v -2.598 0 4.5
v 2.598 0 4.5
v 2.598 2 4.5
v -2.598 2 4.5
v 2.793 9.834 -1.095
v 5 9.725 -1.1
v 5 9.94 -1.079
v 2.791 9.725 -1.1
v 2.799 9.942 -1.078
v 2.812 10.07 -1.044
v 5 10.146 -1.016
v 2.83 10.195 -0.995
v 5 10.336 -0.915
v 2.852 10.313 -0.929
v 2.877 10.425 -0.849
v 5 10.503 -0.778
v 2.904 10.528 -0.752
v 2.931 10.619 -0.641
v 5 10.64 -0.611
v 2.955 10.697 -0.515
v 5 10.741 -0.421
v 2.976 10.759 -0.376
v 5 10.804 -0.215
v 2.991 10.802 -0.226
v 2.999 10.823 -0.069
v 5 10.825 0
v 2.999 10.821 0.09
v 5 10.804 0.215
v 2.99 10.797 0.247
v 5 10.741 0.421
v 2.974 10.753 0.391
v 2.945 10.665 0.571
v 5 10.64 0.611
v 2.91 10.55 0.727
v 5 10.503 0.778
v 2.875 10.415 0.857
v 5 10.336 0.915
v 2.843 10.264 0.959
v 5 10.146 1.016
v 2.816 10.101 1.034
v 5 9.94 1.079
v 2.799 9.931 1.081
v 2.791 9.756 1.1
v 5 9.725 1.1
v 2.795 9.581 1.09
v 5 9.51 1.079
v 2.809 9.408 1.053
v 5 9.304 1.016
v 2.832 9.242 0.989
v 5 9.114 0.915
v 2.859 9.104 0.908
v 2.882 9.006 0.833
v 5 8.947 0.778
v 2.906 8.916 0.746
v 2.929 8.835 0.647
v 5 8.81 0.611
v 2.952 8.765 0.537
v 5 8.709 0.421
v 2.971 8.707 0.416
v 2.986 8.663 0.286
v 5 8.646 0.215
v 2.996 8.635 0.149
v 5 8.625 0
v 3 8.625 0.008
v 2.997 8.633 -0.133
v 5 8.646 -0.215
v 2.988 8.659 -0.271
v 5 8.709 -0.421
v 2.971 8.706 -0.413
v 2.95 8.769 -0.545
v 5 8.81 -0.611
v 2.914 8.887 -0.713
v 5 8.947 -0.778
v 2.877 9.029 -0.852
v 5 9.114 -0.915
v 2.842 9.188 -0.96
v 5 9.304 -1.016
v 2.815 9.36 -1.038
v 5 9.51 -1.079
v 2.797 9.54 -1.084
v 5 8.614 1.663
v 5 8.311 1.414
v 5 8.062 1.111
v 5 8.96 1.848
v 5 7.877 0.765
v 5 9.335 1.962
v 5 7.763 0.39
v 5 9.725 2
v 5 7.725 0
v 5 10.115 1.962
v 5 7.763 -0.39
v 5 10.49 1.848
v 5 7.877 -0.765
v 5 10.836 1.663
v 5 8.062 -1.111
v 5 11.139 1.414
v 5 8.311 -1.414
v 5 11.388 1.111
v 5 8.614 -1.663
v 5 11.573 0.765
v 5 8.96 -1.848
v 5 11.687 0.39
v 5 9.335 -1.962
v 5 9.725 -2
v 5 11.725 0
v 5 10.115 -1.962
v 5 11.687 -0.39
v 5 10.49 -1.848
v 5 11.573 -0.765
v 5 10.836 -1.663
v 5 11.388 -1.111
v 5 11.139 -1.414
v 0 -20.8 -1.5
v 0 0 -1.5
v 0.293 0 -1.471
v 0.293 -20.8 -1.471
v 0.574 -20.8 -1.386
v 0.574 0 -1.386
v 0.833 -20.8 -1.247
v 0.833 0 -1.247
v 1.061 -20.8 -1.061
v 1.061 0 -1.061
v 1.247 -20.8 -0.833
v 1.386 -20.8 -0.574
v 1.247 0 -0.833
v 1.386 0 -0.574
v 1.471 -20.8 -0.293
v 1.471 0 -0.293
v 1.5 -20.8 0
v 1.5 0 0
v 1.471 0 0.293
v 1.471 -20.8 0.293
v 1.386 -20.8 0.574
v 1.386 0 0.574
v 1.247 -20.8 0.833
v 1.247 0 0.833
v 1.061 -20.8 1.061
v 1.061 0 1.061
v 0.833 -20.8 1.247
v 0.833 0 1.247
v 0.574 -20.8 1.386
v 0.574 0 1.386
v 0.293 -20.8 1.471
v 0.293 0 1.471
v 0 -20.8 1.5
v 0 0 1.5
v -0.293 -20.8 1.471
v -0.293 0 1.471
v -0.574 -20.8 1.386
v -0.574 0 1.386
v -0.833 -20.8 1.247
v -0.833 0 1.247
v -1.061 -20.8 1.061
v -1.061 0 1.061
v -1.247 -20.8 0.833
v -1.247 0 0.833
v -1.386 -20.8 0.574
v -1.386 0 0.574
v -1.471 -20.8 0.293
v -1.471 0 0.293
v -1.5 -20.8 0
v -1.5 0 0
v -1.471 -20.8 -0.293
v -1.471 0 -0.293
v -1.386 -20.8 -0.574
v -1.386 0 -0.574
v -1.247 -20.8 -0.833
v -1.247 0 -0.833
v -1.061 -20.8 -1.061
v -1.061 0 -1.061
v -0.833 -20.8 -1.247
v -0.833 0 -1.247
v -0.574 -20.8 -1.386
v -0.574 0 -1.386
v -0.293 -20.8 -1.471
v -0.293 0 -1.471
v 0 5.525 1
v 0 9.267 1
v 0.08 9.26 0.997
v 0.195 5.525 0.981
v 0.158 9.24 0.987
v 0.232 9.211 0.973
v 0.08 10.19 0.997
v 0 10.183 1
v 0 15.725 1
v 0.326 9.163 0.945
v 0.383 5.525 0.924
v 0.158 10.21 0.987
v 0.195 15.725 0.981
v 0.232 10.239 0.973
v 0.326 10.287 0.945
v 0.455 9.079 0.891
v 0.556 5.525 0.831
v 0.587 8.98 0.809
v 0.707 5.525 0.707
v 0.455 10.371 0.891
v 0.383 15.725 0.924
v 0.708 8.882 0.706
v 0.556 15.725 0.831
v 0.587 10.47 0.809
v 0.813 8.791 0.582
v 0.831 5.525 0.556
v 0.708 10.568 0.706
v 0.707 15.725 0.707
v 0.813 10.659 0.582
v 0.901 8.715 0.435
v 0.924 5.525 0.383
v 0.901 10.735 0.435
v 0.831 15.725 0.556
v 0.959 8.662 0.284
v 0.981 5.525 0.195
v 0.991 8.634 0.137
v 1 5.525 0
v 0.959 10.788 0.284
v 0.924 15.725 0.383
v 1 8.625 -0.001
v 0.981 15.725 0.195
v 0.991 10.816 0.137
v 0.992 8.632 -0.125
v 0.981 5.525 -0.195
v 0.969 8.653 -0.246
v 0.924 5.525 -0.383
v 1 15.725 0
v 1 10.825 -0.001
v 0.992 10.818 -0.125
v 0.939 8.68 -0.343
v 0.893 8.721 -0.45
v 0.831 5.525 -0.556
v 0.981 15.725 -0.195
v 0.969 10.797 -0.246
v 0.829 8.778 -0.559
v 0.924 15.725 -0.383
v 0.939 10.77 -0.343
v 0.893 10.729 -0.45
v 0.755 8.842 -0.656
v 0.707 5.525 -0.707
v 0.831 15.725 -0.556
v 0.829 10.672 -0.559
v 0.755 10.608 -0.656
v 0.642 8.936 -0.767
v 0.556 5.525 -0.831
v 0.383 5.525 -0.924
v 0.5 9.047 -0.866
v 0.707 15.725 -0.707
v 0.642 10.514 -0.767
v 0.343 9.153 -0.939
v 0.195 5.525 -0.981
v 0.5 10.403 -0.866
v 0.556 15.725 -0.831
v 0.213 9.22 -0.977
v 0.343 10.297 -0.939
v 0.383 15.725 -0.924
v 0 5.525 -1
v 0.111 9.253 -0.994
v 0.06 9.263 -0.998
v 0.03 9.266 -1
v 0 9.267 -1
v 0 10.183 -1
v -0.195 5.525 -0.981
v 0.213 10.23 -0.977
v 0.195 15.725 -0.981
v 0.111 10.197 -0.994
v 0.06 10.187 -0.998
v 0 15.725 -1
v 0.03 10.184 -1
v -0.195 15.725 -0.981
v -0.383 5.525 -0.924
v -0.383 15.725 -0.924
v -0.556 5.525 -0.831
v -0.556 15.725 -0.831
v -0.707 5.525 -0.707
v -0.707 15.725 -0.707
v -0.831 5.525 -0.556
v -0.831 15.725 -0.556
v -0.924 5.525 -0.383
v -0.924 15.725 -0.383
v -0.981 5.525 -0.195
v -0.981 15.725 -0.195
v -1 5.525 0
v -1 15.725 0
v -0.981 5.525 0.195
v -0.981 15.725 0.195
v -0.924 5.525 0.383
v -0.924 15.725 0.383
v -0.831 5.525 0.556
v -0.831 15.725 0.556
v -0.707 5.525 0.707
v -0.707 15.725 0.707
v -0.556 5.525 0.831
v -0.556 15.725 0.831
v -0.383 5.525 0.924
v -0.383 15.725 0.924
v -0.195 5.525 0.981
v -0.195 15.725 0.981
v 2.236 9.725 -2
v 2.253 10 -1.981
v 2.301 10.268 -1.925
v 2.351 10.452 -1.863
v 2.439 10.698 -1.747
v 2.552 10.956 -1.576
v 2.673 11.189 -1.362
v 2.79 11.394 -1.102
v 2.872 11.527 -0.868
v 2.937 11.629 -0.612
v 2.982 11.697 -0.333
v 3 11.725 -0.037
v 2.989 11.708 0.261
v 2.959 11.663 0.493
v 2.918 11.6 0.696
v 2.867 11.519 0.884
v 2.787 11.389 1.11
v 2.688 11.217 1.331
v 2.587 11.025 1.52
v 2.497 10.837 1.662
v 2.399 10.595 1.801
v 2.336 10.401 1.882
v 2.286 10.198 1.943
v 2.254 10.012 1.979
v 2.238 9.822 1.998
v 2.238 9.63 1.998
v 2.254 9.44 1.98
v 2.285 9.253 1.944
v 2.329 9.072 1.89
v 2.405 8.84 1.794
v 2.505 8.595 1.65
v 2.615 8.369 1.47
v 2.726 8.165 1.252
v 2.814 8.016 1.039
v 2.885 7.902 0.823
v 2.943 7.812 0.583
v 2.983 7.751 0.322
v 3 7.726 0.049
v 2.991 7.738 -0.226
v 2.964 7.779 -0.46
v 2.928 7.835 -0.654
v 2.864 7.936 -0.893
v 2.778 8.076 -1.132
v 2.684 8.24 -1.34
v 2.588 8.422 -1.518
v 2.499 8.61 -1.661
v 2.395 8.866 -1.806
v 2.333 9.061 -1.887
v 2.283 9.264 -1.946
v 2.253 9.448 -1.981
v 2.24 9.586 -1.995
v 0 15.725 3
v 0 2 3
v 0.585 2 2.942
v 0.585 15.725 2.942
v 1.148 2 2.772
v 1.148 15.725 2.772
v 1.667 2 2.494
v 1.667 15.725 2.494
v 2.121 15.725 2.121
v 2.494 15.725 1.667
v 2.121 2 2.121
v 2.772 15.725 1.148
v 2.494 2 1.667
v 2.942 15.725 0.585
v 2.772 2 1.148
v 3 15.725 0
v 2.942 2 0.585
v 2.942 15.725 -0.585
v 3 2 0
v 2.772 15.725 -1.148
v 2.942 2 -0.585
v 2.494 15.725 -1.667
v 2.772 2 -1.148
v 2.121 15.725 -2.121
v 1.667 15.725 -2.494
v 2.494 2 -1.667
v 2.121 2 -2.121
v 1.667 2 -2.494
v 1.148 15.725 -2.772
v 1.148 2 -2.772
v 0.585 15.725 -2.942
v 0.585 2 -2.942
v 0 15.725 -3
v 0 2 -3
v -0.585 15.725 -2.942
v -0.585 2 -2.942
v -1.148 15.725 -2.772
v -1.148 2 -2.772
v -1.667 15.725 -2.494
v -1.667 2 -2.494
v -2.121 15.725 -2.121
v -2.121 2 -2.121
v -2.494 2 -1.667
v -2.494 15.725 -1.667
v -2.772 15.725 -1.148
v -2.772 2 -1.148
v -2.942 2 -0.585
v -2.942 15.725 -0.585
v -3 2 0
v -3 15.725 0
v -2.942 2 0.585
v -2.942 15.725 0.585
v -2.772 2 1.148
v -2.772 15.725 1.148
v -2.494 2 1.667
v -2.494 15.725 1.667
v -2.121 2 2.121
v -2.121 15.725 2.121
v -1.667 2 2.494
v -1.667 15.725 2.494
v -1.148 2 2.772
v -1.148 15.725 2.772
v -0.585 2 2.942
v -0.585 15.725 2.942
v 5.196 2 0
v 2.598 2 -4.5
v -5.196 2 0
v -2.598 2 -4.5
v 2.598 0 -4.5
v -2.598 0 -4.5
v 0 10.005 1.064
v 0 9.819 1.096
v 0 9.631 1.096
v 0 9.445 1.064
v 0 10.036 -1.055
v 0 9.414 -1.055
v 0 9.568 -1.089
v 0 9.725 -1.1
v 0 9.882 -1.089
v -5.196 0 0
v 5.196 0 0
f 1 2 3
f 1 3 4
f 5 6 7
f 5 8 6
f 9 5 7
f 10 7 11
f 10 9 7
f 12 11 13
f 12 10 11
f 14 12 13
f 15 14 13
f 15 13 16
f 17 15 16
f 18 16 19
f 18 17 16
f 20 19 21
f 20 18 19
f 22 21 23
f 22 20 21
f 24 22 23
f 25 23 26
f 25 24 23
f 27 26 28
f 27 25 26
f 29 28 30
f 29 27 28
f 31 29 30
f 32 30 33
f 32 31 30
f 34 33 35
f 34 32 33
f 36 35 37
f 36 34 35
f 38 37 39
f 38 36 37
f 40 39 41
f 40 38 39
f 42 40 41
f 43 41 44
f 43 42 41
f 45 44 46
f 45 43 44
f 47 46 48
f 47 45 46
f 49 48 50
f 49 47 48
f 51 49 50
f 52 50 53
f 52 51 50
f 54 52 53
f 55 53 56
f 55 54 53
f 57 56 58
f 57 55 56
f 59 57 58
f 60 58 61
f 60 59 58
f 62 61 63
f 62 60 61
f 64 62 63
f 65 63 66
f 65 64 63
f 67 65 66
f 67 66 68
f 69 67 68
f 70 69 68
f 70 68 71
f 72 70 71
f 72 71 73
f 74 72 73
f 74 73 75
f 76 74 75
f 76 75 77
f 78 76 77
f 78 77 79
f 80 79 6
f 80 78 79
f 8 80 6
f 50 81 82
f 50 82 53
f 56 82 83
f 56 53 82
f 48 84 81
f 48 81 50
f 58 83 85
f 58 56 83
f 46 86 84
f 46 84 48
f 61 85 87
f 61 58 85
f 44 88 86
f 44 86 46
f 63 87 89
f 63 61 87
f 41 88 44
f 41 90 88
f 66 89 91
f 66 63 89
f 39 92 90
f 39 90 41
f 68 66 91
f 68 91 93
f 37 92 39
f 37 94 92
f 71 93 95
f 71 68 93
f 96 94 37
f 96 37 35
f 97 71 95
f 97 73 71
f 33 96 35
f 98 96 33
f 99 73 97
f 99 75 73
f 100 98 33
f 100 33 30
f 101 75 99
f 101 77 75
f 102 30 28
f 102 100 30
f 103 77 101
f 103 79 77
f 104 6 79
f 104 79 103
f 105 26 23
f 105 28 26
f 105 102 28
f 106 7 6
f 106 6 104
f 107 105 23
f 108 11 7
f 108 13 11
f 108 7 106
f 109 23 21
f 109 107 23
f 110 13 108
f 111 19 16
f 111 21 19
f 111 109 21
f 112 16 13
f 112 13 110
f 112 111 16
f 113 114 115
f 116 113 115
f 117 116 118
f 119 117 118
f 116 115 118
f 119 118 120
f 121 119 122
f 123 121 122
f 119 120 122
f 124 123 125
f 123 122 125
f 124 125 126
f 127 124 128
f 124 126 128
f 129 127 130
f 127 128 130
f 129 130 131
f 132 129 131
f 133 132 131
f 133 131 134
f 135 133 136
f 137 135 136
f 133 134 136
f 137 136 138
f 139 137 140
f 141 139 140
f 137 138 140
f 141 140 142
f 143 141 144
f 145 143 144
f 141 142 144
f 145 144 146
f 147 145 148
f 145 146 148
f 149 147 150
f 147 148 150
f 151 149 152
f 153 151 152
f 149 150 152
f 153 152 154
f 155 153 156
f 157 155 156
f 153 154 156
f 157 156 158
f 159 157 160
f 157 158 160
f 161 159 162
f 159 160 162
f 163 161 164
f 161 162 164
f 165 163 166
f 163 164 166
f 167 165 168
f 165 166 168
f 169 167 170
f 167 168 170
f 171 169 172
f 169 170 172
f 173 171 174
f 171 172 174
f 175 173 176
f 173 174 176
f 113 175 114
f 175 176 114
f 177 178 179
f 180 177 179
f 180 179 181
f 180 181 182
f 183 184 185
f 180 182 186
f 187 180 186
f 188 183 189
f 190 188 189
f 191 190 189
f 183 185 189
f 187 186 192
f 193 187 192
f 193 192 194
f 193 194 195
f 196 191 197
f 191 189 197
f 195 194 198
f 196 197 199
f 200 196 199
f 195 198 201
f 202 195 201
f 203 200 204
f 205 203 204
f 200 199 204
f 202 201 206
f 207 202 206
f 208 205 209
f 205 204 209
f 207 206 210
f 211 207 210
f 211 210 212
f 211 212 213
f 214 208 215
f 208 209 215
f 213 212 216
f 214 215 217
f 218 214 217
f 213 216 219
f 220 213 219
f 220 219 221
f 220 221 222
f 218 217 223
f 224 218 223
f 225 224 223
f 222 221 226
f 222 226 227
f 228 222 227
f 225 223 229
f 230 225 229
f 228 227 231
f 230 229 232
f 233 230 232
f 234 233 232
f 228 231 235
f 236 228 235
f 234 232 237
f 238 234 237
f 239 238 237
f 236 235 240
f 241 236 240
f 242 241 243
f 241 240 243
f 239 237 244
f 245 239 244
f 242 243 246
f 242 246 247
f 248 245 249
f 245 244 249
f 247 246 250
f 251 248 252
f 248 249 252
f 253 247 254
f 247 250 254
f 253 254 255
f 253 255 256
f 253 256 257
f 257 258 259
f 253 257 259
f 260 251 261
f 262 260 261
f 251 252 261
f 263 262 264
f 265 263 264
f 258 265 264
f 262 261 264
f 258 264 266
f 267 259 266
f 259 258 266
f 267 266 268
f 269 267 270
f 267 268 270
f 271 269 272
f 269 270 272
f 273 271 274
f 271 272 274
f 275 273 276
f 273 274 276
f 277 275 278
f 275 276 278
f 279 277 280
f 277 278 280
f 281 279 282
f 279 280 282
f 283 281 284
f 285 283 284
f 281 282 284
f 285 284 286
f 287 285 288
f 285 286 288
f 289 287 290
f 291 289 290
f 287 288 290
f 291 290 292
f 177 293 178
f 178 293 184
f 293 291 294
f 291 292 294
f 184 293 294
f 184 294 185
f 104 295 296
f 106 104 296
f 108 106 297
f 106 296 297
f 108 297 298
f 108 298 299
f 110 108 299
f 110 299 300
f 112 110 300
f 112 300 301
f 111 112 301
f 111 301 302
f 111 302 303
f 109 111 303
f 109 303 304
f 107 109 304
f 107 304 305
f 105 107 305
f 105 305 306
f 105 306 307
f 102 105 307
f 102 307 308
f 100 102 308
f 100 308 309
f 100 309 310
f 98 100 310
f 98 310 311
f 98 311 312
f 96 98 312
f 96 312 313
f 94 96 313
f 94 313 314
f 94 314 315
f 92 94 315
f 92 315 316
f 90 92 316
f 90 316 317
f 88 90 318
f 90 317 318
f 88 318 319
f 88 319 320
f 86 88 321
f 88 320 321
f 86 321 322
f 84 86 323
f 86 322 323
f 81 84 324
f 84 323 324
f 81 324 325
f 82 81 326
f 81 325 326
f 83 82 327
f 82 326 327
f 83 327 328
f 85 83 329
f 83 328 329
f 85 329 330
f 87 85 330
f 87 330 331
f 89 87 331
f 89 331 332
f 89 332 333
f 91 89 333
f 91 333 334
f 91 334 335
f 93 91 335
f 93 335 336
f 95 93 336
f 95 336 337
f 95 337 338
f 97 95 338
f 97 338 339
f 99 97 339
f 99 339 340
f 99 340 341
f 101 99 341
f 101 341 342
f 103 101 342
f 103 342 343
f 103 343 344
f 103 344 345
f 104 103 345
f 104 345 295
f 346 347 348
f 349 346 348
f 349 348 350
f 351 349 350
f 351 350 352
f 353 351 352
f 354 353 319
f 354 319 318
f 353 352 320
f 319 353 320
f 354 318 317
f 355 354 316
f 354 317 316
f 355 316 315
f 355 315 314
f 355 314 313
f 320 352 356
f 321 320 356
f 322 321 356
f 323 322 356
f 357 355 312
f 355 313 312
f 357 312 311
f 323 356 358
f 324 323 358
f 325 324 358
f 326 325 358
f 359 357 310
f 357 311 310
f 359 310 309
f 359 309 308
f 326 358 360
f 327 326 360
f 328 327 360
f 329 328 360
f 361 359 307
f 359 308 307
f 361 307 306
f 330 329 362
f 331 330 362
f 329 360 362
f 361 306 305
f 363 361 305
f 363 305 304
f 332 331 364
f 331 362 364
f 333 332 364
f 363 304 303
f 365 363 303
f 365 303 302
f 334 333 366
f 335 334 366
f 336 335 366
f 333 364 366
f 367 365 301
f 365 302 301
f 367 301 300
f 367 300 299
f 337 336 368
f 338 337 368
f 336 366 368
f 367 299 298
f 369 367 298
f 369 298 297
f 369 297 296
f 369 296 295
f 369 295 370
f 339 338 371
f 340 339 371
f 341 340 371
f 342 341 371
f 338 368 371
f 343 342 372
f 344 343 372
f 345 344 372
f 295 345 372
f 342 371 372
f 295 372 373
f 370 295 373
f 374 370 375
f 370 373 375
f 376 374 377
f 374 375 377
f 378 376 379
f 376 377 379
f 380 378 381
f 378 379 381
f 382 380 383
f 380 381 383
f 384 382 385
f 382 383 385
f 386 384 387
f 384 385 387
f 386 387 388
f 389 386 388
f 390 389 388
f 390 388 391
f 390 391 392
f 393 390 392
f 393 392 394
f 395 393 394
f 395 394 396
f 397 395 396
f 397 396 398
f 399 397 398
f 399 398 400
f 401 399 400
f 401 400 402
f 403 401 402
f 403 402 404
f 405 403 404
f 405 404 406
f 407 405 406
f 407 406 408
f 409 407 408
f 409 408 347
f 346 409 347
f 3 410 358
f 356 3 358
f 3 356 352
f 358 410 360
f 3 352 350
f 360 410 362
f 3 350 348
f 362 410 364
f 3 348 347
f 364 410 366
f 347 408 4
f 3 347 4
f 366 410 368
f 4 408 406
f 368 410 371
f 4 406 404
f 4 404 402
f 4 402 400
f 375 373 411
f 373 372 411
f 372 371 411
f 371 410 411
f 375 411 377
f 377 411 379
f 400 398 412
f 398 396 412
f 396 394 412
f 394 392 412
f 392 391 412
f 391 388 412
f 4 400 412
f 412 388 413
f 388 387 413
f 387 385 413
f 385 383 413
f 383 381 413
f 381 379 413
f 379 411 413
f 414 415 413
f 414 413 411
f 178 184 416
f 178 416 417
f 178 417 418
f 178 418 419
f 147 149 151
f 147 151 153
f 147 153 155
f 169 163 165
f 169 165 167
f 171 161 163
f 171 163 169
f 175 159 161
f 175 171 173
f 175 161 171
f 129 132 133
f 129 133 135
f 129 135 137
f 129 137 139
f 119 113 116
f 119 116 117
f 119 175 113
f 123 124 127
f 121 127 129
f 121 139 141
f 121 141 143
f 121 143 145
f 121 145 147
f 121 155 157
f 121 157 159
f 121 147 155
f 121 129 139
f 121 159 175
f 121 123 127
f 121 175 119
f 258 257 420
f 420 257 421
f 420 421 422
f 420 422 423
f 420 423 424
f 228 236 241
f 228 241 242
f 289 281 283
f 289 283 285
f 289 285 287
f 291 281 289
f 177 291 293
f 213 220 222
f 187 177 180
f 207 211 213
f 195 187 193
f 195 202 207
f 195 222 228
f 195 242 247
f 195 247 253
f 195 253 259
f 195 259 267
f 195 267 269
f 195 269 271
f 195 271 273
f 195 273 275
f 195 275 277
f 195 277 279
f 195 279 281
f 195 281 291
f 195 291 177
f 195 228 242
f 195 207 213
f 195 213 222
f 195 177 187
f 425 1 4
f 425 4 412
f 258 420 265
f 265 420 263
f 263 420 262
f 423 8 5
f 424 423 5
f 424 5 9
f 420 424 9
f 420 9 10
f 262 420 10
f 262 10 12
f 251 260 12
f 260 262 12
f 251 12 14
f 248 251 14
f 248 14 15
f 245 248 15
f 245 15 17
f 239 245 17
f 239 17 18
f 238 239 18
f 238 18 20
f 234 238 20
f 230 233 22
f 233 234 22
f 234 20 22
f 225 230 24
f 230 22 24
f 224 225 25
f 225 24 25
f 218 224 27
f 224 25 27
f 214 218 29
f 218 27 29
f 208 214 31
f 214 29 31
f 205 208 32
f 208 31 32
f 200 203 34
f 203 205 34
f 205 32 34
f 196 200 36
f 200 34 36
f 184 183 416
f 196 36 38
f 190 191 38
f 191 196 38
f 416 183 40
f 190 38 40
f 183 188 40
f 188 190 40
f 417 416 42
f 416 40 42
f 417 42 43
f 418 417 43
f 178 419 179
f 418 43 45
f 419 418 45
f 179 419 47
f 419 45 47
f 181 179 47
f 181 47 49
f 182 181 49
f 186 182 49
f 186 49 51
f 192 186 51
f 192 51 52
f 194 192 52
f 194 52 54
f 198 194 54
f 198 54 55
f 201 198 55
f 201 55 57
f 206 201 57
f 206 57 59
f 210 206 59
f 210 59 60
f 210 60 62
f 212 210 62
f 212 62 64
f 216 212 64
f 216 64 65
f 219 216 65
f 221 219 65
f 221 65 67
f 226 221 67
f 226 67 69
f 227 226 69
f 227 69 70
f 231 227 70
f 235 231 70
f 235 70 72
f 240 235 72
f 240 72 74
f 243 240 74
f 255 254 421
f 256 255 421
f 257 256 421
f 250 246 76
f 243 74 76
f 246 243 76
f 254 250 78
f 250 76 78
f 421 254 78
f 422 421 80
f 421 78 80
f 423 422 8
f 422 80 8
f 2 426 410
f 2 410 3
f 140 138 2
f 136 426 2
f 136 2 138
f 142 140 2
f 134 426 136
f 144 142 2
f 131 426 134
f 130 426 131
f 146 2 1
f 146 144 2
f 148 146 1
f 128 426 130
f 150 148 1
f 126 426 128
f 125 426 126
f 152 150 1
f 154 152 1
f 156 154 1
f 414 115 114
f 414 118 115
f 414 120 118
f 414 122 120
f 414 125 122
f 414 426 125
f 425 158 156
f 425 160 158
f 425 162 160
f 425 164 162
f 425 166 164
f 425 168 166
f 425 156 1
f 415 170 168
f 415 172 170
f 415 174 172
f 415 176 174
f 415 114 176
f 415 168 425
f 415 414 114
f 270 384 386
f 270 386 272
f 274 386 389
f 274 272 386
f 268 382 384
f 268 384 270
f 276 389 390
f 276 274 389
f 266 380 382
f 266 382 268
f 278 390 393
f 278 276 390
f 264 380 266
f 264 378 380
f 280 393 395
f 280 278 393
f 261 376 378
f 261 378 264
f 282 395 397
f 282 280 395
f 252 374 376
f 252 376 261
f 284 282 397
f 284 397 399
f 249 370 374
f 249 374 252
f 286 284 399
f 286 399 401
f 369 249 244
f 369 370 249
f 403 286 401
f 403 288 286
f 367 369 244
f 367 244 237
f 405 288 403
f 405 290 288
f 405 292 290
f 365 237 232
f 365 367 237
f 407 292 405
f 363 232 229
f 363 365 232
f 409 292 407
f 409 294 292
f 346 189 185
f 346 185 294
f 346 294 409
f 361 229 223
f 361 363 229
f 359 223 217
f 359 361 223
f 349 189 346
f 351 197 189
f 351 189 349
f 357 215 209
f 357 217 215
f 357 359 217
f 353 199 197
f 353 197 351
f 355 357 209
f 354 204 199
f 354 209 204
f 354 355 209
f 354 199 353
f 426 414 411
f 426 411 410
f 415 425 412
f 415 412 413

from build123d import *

# Parameters (mm, degrees)
SKETCH1_R                = 3
BOSS_EXTRUDE1_DEPTH      = 15.725
SKETCH2_R                = 1
CUT_EXTRUDE3_DEPTH       = 10.2
BOSS_EXTRUDE2_DEPTH      = 2
SKETCH4_R                = 1.5
BOSS_EXTRUDE3_DEPTH      = 20.8
BOSS_EXTRUDE4_DEPTH      = 2
BOSS_EXTRUDE4_DEPTH_BACK = 1
SKETCH6_R                = 2
SKETCH6_R_2              = 1.1
SKETCH7_R                = 1.1
CUT_EXTRUDE4_DEPTH       = 3


with BuildPart() as part:
    # Sketch1 → Boss-Extrude1 (new body)
    with BuildSketch(Plane(origin=(0, 0, 0), x_dir=(1, 0, 0), z_dir=(0, 1, 0))):
        with Locations(Location((0, 0, 0), (0, 0, 270))):
            Circle(SKETCH1_R)
    extrude(amount=BOSS_EXTRUDE1_DEPTH)

    # Sketch2 → Cut-Extrude3 (cut)
    with BuildSketch(Plane(origin=(0, 15.725, 0), x_dir=(1, 0, 0), z_dir=(0, 1, 0))):
        with Locations(Location((0, 0, 0), (0, 0, 270))):
            Circle(SKETCH2_R)
    extrude(amount=-CUT_EXTRUDE3_DEPTH, mode=Mode.SUBTRACT)

    # Sketch3 → Boss-Extrude2 (add)
    with BuildSketch(Plane(origin=(0, 0, 0), x_dir=(-1, 0, 0), z_dir=(0, -1, 0))):
        Polygon((5.196152423, 0), (2.598076211, 4.5), (-2.598076211, 4.5), (-5.196152423, 0), (-2.598076211, -4.5), (2.598076211, -4.5), align=None)
    extrude(amount=-BOSS_EXTRUDE2_DEPTH)

    # Sketch4 → Boss-Extrude3 (add)
    with BuildSketch(Plane(origin=(0, 0, 0), x_dir=(-1, 0, 0), z_dir=(0, -1, 0))):
        with Locations(Location((0, 0, 0), (0, 0, 90))):
            Circle(SKETCH4_R)
    extrude(amount=BOSS_EXTRUDE3_DEPTH)

    # Sketch6 → Boss-Extrude4 (add, two sides: drawn at the far end of the back side and taken through both)
    with BuildSketch(Plane(origin=(3, 0, 0), x_dir=(0, 0, -1), z_dir=(1, 0, 0)).offset(-BOSS_EXTRUDE4_DEPTH_BACK)):
        with Locations((0, 9.725)):
            Circle(SKETCH6_R)
        with Locations((0, 9.725)):
            Circle(SKETCH6_R_2, mode=Mode.SUBTRACT)
    extrude(amount=BOSS_EXTRUDE4_DEPTH + BOSS_EXTRUDE4_DEPTH_BACK)

    # Sketch7 → Cut-Extrude4 (cut)
    with BuildSketch(Plane(origin=(3, 0, 0), x_dir=(0, 0, -1), z_dir=(1, 0, 0))):
        with Locations((0, 9.725)):
            Circle(SKETCH7_R)
    extrude(amount=-CUT_EXTRUDE4_DEPTH, mode=Mode.SUBTRACT)


solid = part.part
